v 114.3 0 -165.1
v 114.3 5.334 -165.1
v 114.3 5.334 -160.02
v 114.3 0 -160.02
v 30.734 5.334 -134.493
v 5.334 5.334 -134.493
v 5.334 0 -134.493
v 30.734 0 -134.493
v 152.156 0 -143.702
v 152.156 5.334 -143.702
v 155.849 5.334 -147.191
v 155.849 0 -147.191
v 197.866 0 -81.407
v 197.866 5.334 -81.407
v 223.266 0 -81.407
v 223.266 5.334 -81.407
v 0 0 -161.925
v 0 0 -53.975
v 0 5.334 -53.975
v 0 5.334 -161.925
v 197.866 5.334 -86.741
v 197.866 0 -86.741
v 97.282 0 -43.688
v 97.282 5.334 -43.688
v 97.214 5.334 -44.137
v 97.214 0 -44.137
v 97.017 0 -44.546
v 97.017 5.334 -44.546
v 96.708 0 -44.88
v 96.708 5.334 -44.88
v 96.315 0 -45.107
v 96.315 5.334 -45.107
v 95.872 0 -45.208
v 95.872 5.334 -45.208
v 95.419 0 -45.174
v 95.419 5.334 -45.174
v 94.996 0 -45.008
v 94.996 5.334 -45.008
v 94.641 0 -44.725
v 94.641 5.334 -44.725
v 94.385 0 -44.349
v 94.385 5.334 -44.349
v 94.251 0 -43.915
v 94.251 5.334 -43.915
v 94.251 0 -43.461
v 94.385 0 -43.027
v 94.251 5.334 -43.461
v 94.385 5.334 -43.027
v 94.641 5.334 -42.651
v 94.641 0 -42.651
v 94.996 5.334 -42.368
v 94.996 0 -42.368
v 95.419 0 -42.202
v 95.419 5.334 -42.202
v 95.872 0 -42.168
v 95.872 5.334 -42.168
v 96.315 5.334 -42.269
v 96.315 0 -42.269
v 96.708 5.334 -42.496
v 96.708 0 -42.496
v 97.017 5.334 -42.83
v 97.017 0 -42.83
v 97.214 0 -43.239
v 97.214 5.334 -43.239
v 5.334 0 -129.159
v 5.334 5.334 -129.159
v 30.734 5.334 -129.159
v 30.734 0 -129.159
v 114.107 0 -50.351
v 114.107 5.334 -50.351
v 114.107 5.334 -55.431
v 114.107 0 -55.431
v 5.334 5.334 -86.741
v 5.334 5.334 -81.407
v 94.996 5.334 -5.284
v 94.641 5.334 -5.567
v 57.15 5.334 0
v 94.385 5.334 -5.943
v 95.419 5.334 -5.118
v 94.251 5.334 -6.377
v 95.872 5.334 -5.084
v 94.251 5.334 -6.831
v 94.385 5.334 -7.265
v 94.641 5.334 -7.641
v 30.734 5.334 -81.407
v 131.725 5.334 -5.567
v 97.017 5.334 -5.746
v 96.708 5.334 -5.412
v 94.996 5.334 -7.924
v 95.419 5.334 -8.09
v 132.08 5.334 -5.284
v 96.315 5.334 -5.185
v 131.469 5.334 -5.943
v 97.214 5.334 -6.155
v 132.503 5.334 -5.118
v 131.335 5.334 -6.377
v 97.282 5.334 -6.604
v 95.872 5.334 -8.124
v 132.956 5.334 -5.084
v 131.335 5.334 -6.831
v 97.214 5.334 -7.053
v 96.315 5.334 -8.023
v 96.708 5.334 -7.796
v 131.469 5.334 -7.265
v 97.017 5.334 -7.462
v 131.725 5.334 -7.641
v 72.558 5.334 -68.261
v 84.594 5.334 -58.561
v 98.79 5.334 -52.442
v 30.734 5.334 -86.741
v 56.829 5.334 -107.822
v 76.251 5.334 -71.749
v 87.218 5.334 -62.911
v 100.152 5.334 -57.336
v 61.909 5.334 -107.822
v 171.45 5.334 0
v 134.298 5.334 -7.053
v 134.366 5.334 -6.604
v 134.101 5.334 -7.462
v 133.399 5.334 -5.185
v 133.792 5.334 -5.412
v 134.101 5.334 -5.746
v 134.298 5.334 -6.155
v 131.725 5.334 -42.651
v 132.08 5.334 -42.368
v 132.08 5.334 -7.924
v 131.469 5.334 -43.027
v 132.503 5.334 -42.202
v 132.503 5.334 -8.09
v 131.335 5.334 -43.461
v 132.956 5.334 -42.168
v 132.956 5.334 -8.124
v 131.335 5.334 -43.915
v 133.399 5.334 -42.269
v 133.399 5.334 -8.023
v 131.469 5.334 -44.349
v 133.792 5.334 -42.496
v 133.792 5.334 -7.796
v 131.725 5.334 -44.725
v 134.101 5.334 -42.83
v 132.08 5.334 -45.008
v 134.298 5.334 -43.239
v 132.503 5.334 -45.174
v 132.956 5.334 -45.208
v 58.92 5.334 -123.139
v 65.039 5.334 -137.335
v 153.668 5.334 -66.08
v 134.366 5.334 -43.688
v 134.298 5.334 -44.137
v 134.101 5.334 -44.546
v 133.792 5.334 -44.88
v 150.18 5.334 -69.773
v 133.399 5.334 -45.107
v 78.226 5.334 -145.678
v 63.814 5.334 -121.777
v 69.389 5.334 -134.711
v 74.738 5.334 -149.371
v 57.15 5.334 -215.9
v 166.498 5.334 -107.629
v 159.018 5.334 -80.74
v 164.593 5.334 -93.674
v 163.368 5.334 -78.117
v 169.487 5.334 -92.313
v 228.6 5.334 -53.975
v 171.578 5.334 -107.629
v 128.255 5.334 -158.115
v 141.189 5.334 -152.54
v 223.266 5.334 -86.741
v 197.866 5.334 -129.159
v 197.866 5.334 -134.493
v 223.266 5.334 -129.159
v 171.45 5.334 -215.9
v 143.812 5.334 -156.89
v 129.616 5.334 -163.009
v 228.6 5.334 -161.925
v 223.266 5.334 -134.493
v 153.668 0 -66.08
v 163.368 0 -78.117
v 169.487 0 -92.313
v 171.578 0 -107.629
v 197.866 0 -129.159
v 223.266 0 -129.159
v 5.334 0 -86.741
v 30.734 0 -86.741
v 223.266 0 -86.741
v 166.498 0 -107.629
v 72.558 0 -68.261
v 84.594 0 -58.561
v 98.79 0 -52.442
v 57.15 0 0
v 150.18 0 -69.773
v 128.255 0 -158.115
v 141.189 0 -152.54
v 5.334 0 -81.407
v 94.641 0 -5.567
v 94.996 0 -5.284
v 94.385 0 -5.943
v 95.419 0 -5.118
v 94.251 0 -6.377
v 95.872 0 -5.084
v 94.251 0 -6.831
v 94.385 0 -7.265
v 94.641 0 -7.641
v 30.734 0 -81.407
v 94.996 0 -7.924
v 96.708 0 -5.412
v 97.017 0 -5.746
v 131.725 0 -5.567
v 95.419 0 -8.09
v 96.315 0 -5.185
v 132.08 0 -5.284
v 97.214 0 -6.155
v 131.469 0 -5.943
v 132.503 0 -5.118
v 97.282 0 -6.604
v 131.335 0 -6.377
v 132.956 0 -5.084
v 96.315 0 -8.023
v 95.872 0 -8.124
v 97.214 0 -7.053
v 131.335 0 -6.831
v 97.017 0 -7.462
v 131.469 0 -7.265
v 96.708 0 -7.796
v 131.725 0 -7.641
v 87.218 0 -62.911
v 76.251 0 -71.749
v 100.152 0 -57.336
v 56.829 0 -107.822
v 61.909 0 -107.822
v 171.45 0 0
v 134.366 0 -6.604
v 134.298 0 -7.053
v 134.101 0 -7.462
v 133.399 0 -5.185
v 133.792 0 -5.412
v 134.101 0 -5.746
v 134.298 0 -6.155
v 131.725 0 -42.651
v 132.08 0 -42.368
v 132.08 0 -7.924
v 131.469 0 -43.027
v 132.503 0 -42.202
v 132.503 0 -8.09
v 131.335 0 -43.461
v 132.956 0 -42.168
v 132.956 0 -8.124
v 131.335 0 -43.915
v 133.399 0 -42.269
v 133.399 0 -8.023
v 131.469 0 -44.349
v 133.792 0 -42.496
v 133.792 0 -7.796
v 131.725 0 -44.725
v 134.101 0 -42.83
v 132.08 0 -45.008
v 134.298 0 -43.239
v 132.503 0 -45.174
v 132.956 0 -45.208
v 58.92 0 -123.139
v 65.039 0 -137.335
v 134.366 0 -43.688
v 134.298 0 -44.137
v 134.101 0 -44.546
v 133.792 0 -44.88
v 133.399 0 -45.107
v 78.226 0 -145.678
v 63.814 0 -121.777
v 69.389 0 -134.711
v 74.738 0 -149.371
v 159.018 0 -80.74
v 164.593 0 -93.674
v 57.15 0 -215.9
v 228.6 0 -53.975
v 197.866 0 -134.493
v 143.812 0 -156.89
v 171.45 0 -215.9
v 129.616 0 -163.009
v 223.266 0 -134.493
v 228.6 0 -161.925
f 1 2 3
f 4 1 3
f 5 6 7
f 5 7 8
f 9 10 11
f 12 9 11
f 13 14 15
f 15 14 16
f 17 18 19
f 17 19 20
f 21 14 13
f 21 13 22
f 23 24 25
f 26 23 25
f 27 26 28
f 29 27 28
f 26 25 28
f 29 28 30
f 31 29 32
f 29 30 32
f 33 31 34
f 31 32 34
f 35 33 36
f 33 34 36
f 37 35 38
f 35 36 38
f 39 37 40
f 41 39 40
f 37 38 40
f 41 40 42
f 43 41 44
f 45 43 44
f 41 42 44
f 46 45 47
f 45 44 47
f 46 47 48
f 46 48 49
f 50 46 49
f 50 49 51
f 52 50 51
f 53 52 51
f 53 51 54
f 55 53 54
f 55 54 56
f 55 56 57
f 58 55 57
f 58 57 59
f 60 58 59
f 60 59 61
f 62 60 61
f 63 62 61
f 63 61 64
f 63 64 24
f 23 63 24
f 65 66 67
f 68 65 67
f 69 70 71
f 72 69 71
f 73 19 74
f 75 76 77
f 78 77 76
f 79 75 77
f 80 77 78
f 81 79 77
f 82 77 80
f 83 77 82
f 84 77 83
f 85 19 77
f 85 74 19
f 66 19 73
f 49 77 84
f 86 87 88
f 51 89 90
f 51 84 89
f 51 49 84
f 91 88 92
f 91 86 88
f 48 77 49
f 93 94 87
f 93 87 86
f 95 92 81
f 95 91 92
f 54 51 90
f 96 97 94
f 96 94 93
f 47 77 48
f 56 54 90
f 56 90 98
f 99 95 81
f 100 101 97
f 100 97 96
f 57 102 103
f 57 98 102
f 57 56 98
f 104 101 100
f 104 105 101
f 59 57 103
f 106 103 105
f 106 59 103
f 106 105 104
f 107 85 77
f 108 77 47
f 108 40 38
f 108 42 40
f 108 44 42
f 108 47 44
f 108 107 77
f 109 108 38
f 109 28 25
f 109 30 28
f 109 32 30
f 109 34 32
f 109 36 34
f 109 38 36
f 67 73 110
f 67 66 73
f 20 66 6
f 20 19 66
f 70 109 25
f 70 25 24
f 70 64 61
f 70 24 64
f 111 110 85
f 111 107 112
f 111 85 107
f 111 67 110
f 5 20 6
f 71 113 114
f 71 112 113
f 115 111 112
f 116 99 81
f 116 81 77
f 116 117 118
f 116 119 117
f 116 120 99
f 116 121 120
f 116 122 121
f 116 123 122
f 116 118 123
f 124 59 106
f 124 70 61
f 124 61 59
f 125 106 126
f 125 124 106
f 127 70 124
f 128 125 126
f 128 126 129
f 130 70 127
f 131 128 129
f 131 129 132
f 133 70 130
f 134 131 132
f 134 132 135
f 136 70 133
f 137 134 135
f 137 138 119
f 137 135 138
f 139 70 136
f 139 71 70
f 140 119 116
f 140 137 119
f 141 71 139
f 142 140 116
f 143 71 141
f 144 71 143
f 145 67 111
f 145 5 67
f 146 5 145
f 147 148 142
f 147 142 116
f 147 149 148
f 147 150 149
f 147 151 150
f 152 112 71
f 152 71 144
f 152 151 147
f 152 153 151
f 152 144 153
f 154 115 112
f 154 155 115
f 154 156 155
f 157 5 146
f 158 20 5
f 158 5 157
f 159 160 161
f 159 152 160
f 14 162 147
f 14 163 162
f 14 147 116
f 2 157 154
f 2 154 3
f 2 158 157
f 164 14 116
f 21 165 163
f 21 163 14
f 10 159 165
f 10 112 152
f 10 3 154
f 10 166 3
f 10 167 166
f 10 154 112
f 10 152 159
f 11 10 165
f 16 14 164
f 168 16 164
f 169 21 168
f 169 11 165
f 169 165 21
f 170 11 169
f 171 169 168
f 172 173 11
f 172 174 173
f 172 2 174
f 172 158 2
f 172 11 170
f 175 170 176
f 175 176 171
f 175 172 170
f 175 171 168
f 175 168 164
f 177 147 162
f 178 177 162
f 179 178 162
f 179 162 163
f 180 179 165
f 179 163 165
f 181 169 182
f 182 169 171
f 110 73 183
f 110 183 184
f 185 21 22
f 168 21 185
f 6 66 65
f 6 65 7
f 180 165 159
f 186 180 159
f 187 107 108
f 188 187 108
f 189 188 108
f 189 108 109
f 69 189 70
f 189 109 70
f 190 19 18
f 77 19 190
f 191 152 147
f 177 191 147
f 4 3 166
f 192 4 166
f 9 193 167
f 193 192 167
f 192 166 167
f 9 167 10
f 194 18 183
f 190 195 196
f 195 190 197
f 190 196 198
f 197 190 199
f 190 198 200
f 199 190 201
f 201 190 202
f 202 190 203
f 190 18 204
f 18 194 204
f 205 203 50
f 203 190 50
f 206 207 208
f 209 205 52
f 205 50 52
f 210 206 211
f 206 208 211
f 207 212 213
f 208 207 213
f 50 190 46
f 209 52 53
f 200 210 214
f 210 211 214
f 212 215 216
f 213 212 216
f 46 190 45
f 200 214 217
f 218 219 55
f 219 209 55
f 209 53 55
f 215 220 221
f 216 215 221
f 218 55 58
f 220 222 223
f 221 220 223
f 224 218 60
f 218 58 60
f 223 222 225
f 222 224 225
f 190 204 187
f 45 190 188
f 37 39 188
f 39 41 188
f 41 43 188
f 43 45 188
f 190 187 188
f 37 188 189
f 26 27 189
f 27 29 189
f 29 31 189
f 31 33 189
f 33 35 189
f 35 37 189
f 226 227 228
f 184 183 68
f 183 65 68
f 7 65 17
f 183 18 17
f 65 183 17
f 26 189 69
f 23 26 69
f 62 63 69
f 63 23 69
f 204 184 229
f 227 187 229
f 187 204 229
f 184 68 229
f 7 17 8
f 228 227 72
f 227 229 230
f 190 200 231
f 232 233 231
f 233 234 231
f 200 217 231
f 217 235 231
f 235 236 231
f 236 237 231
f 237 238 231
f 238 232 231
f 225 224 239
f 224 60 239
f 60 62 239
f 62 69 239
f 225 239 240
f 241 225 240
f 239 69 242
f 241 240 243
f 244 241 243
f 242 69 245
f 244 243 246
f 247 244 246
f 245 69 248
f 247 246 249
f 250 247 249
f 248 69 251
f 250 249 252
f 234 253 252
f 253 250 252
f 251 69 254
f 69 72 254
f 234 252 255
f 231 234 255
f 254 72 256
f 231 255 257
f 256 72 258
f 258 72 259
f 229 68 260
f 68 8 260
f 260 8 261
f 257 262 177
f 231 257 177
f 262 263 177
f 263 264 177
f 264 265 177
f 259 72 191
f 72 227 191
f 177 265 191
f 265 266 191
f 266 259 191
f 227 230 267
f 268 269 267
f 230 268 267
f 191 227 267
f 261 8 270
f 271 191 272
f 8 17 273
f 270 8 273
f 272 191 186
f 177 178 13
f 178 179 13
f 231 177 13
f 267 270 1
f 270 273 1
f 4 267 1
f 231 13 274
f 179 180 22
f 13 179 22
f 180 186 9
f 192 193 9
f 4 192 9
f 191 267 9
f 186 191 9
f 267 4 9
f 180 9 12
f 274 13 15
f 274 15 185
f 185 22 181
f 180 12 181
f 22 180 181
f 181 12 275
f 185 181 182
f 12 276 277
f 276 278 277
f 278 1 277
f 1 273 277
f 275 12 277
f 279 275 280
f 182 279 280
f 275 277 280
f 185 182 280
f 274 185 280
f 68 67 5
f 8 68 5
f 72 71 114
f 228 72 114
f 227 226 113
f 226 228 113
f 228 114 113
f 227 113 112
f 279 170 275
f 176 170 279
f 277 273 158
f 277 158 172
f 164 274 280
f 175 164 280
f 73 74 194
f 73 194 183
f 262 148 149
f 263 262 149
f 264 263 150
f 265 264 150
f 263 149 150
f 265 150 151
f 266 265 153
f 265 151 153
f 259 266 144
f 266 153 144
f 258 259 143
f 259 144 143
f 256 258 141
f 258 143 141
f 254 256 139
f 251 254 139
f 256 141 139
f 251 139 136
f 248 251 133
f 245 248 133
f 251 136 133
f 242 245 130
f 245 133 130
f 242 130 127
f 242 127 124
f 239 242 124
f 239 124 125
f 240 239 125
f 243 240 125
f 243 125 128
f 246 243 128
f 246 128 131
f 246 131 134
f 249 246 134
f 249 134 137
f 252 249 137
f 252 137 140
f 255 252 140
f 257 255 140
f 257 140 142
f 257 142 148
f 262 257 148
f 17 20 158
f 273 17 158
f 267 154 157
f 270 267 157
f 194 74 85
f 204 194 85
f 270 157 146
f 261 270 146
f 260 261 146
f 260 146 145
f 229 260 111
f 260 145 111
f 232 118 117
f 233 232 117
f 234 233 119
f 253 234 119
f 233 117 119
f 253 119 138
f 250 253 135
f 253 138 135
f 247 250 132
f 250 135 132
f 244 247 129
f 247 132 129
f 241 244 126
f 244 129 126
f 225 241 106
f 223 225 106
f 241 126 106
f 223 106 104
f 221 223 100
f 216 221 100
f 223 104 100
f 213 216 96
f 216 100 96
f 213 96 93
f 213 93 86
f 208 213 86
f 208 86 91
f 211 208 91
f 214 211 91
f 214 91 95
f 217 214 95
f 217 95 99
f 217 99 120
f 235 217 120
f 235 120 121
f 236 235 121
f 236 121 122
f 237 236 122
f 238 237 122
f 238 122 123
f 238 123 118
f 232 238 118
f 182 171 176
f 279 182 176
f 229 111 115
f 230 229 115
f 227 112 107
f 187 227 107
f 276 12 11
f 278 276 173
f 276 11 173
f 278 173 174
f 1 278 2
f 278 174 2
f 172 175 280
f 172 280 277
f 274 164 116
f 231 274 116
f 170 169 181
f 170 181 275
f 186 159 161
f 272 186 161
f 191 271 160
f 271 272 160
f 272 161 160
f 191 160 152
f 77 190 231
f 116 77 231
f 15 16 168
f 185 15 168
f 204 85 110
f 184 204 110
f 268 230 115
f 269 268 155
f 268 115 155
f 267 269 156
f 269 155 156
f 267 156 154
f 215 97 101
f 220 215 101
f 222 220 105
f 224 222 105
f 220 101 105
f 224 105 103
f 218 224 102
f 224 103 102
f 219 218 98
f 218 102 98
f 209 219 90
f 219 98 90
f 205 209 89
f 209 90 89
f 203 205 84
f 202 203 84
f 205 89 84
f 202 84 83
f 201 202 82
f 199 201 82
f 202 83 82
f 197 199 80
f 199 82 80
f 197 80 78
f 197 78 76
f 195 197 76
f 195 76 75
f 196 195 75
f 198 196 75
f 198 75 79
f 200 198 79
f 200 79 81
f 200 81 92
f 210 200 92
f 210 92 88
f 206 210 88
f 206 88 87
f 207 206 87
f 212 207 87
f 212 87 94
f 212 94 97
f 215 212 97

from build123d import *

# Parameters (mm, degrees)
SKETCH1_W           = 228.6
SKETCH1_H           = 215.9
BOSS_EXTRUDE1_DEPTH = 5.334
CUT_EXTRUDE1_DEPTH  = 6.334
CIRPATTERN1_COUNT   = 4
SKETCH8_W           = 25.4
SKETCH8_H           = 5.334
CUT_EXTRUDE2_DEPTH  = 6.334
SKETCH11_R          = 1.524
CUT_EXTRUDE4_DEPTH  = 6.334
CUT_EXTRUDE5_DEPTH  = 6.334


with BuildPart() as part:
    # Sketch1 → Boss-Extrude1 (new body)
    with BuildSketch(Plane(origin=(0, 0, 0), x_dir=(1, 0, 0), z_dir=(0, 1, 0))):
        with Locations((114.3, 107.95)):
            Rectangle(SKETCH1_W, SKETCH1_H)
    extrude(amount=BOSS_EXTRUDE1_DEPTH)

    # Sketch6 → Cut-Extrude1 (cut, through all)
    with BuildSketch(Plane(origin=(0, 5.334, 0), x_dir=(1, 0, 0), z_dir=(0, 1, 0))):
        with BuildLine():
            Line((114.3, 165.1), (114.3, 160.02))
            ThreePointArc((114.3, 160.02), (134.911318287, 155.766926485), (152.155574853, 143.702487361))
            Line((152.155574853, 143.702487361), (155.848801668, 147.190534909))
            ThreePointArc((155.848801668, 147.190534909), (136.922178608, 160.431992483), (114.3, 165.1))
        make_face()
    cut_extrude1 = extrude(amount=-CUT_EXTRUDE1_DEPTH, mode=Mode.SUBTRACT)

    # CirPattern1: Cut-Extrude1 ×4 about axis
    cirpattern1_axis = Axis((114.20329472, 0, -107.72565), (0, 1, 0))
    for i in range(1, CIRPATTERN1_COUNT):
        add(cut_extrude1.rotate(cirpattern1_axis, i * 360 / CIRPATTERN1_COUNT), mode=Mode.SUBTRACT)

    # Sketch8 → Cut-Extrude2 (cut, through all)
    with BuildSketch(Plane(origin=(0, 5.334, 0), x_dir=(1, 0, 0), z_dir=(0, 1, 0))):
        with Locations((18.034, 131.826)):
            Rectangle(SKETCH8_W, SKETCH8_H)
        with Locations((210.566, 131.826)):
            Rectangle(SKETCH8_W, SKETCH8_H)
        with Locations((210.566, 84.074)):
            Rectangle(SKETCH8_W, SKETCH8_H)
        with Locations((18.034, 84.074)):
            Rectangle(SKETCH8_W, SKETCH8_H)
    extrude(amount=-CUT_EXTRUDE2_DEPTH, mode=Mode.SUBTRACT)

    # Sketch11 → Cut-Extrude4 (cut, through all)
    with BuildSketch(Plane(origin=(0, 5.334, 0), x_dir=(1, 0, 0), z_dir=(0, 1, 0))):
        with Locations((95.758, 6.604)):
            Circle(SKETCH11_R)
        with Locations((132.842, 6.604)):
            Circle(SKETCH11_R)
        with Locations((132.842, 43.688)):
            Circle(SKETCH11_R)
        with Locations((95.758, 43.688)):
            Circle(SKETCH11_R)
    extrude(amount=-CUT_EXTRUDE4_DEPTH, mode=Mode.SUBTRACT)

    # Sketch13 → Cut-Extrude5 (cut, through all)
    with BuildSketch(Plane(origin=(0, 5.334, 0), x_dir=(1, 0, 0), z_dir=(0, 1, 0))):
        Polygon((0, 215.9), (0, 161.925), (57.15, 215.9), align=None)
        Polygon((228.6, 161.925), (171.45, 215.9), (228.6, 215.9), align=None)
        Polygon((228.6, 0), (228.6, 53.975), (171.45, 0), align=None)
        Polygon((0, 53.975), (57.15, 0), (0, 0), align=None)
    extrude(amount=-CUT_EXTRUDE5_DEPTH, mode=Mode.SUBTRACT)


solid = part.part
